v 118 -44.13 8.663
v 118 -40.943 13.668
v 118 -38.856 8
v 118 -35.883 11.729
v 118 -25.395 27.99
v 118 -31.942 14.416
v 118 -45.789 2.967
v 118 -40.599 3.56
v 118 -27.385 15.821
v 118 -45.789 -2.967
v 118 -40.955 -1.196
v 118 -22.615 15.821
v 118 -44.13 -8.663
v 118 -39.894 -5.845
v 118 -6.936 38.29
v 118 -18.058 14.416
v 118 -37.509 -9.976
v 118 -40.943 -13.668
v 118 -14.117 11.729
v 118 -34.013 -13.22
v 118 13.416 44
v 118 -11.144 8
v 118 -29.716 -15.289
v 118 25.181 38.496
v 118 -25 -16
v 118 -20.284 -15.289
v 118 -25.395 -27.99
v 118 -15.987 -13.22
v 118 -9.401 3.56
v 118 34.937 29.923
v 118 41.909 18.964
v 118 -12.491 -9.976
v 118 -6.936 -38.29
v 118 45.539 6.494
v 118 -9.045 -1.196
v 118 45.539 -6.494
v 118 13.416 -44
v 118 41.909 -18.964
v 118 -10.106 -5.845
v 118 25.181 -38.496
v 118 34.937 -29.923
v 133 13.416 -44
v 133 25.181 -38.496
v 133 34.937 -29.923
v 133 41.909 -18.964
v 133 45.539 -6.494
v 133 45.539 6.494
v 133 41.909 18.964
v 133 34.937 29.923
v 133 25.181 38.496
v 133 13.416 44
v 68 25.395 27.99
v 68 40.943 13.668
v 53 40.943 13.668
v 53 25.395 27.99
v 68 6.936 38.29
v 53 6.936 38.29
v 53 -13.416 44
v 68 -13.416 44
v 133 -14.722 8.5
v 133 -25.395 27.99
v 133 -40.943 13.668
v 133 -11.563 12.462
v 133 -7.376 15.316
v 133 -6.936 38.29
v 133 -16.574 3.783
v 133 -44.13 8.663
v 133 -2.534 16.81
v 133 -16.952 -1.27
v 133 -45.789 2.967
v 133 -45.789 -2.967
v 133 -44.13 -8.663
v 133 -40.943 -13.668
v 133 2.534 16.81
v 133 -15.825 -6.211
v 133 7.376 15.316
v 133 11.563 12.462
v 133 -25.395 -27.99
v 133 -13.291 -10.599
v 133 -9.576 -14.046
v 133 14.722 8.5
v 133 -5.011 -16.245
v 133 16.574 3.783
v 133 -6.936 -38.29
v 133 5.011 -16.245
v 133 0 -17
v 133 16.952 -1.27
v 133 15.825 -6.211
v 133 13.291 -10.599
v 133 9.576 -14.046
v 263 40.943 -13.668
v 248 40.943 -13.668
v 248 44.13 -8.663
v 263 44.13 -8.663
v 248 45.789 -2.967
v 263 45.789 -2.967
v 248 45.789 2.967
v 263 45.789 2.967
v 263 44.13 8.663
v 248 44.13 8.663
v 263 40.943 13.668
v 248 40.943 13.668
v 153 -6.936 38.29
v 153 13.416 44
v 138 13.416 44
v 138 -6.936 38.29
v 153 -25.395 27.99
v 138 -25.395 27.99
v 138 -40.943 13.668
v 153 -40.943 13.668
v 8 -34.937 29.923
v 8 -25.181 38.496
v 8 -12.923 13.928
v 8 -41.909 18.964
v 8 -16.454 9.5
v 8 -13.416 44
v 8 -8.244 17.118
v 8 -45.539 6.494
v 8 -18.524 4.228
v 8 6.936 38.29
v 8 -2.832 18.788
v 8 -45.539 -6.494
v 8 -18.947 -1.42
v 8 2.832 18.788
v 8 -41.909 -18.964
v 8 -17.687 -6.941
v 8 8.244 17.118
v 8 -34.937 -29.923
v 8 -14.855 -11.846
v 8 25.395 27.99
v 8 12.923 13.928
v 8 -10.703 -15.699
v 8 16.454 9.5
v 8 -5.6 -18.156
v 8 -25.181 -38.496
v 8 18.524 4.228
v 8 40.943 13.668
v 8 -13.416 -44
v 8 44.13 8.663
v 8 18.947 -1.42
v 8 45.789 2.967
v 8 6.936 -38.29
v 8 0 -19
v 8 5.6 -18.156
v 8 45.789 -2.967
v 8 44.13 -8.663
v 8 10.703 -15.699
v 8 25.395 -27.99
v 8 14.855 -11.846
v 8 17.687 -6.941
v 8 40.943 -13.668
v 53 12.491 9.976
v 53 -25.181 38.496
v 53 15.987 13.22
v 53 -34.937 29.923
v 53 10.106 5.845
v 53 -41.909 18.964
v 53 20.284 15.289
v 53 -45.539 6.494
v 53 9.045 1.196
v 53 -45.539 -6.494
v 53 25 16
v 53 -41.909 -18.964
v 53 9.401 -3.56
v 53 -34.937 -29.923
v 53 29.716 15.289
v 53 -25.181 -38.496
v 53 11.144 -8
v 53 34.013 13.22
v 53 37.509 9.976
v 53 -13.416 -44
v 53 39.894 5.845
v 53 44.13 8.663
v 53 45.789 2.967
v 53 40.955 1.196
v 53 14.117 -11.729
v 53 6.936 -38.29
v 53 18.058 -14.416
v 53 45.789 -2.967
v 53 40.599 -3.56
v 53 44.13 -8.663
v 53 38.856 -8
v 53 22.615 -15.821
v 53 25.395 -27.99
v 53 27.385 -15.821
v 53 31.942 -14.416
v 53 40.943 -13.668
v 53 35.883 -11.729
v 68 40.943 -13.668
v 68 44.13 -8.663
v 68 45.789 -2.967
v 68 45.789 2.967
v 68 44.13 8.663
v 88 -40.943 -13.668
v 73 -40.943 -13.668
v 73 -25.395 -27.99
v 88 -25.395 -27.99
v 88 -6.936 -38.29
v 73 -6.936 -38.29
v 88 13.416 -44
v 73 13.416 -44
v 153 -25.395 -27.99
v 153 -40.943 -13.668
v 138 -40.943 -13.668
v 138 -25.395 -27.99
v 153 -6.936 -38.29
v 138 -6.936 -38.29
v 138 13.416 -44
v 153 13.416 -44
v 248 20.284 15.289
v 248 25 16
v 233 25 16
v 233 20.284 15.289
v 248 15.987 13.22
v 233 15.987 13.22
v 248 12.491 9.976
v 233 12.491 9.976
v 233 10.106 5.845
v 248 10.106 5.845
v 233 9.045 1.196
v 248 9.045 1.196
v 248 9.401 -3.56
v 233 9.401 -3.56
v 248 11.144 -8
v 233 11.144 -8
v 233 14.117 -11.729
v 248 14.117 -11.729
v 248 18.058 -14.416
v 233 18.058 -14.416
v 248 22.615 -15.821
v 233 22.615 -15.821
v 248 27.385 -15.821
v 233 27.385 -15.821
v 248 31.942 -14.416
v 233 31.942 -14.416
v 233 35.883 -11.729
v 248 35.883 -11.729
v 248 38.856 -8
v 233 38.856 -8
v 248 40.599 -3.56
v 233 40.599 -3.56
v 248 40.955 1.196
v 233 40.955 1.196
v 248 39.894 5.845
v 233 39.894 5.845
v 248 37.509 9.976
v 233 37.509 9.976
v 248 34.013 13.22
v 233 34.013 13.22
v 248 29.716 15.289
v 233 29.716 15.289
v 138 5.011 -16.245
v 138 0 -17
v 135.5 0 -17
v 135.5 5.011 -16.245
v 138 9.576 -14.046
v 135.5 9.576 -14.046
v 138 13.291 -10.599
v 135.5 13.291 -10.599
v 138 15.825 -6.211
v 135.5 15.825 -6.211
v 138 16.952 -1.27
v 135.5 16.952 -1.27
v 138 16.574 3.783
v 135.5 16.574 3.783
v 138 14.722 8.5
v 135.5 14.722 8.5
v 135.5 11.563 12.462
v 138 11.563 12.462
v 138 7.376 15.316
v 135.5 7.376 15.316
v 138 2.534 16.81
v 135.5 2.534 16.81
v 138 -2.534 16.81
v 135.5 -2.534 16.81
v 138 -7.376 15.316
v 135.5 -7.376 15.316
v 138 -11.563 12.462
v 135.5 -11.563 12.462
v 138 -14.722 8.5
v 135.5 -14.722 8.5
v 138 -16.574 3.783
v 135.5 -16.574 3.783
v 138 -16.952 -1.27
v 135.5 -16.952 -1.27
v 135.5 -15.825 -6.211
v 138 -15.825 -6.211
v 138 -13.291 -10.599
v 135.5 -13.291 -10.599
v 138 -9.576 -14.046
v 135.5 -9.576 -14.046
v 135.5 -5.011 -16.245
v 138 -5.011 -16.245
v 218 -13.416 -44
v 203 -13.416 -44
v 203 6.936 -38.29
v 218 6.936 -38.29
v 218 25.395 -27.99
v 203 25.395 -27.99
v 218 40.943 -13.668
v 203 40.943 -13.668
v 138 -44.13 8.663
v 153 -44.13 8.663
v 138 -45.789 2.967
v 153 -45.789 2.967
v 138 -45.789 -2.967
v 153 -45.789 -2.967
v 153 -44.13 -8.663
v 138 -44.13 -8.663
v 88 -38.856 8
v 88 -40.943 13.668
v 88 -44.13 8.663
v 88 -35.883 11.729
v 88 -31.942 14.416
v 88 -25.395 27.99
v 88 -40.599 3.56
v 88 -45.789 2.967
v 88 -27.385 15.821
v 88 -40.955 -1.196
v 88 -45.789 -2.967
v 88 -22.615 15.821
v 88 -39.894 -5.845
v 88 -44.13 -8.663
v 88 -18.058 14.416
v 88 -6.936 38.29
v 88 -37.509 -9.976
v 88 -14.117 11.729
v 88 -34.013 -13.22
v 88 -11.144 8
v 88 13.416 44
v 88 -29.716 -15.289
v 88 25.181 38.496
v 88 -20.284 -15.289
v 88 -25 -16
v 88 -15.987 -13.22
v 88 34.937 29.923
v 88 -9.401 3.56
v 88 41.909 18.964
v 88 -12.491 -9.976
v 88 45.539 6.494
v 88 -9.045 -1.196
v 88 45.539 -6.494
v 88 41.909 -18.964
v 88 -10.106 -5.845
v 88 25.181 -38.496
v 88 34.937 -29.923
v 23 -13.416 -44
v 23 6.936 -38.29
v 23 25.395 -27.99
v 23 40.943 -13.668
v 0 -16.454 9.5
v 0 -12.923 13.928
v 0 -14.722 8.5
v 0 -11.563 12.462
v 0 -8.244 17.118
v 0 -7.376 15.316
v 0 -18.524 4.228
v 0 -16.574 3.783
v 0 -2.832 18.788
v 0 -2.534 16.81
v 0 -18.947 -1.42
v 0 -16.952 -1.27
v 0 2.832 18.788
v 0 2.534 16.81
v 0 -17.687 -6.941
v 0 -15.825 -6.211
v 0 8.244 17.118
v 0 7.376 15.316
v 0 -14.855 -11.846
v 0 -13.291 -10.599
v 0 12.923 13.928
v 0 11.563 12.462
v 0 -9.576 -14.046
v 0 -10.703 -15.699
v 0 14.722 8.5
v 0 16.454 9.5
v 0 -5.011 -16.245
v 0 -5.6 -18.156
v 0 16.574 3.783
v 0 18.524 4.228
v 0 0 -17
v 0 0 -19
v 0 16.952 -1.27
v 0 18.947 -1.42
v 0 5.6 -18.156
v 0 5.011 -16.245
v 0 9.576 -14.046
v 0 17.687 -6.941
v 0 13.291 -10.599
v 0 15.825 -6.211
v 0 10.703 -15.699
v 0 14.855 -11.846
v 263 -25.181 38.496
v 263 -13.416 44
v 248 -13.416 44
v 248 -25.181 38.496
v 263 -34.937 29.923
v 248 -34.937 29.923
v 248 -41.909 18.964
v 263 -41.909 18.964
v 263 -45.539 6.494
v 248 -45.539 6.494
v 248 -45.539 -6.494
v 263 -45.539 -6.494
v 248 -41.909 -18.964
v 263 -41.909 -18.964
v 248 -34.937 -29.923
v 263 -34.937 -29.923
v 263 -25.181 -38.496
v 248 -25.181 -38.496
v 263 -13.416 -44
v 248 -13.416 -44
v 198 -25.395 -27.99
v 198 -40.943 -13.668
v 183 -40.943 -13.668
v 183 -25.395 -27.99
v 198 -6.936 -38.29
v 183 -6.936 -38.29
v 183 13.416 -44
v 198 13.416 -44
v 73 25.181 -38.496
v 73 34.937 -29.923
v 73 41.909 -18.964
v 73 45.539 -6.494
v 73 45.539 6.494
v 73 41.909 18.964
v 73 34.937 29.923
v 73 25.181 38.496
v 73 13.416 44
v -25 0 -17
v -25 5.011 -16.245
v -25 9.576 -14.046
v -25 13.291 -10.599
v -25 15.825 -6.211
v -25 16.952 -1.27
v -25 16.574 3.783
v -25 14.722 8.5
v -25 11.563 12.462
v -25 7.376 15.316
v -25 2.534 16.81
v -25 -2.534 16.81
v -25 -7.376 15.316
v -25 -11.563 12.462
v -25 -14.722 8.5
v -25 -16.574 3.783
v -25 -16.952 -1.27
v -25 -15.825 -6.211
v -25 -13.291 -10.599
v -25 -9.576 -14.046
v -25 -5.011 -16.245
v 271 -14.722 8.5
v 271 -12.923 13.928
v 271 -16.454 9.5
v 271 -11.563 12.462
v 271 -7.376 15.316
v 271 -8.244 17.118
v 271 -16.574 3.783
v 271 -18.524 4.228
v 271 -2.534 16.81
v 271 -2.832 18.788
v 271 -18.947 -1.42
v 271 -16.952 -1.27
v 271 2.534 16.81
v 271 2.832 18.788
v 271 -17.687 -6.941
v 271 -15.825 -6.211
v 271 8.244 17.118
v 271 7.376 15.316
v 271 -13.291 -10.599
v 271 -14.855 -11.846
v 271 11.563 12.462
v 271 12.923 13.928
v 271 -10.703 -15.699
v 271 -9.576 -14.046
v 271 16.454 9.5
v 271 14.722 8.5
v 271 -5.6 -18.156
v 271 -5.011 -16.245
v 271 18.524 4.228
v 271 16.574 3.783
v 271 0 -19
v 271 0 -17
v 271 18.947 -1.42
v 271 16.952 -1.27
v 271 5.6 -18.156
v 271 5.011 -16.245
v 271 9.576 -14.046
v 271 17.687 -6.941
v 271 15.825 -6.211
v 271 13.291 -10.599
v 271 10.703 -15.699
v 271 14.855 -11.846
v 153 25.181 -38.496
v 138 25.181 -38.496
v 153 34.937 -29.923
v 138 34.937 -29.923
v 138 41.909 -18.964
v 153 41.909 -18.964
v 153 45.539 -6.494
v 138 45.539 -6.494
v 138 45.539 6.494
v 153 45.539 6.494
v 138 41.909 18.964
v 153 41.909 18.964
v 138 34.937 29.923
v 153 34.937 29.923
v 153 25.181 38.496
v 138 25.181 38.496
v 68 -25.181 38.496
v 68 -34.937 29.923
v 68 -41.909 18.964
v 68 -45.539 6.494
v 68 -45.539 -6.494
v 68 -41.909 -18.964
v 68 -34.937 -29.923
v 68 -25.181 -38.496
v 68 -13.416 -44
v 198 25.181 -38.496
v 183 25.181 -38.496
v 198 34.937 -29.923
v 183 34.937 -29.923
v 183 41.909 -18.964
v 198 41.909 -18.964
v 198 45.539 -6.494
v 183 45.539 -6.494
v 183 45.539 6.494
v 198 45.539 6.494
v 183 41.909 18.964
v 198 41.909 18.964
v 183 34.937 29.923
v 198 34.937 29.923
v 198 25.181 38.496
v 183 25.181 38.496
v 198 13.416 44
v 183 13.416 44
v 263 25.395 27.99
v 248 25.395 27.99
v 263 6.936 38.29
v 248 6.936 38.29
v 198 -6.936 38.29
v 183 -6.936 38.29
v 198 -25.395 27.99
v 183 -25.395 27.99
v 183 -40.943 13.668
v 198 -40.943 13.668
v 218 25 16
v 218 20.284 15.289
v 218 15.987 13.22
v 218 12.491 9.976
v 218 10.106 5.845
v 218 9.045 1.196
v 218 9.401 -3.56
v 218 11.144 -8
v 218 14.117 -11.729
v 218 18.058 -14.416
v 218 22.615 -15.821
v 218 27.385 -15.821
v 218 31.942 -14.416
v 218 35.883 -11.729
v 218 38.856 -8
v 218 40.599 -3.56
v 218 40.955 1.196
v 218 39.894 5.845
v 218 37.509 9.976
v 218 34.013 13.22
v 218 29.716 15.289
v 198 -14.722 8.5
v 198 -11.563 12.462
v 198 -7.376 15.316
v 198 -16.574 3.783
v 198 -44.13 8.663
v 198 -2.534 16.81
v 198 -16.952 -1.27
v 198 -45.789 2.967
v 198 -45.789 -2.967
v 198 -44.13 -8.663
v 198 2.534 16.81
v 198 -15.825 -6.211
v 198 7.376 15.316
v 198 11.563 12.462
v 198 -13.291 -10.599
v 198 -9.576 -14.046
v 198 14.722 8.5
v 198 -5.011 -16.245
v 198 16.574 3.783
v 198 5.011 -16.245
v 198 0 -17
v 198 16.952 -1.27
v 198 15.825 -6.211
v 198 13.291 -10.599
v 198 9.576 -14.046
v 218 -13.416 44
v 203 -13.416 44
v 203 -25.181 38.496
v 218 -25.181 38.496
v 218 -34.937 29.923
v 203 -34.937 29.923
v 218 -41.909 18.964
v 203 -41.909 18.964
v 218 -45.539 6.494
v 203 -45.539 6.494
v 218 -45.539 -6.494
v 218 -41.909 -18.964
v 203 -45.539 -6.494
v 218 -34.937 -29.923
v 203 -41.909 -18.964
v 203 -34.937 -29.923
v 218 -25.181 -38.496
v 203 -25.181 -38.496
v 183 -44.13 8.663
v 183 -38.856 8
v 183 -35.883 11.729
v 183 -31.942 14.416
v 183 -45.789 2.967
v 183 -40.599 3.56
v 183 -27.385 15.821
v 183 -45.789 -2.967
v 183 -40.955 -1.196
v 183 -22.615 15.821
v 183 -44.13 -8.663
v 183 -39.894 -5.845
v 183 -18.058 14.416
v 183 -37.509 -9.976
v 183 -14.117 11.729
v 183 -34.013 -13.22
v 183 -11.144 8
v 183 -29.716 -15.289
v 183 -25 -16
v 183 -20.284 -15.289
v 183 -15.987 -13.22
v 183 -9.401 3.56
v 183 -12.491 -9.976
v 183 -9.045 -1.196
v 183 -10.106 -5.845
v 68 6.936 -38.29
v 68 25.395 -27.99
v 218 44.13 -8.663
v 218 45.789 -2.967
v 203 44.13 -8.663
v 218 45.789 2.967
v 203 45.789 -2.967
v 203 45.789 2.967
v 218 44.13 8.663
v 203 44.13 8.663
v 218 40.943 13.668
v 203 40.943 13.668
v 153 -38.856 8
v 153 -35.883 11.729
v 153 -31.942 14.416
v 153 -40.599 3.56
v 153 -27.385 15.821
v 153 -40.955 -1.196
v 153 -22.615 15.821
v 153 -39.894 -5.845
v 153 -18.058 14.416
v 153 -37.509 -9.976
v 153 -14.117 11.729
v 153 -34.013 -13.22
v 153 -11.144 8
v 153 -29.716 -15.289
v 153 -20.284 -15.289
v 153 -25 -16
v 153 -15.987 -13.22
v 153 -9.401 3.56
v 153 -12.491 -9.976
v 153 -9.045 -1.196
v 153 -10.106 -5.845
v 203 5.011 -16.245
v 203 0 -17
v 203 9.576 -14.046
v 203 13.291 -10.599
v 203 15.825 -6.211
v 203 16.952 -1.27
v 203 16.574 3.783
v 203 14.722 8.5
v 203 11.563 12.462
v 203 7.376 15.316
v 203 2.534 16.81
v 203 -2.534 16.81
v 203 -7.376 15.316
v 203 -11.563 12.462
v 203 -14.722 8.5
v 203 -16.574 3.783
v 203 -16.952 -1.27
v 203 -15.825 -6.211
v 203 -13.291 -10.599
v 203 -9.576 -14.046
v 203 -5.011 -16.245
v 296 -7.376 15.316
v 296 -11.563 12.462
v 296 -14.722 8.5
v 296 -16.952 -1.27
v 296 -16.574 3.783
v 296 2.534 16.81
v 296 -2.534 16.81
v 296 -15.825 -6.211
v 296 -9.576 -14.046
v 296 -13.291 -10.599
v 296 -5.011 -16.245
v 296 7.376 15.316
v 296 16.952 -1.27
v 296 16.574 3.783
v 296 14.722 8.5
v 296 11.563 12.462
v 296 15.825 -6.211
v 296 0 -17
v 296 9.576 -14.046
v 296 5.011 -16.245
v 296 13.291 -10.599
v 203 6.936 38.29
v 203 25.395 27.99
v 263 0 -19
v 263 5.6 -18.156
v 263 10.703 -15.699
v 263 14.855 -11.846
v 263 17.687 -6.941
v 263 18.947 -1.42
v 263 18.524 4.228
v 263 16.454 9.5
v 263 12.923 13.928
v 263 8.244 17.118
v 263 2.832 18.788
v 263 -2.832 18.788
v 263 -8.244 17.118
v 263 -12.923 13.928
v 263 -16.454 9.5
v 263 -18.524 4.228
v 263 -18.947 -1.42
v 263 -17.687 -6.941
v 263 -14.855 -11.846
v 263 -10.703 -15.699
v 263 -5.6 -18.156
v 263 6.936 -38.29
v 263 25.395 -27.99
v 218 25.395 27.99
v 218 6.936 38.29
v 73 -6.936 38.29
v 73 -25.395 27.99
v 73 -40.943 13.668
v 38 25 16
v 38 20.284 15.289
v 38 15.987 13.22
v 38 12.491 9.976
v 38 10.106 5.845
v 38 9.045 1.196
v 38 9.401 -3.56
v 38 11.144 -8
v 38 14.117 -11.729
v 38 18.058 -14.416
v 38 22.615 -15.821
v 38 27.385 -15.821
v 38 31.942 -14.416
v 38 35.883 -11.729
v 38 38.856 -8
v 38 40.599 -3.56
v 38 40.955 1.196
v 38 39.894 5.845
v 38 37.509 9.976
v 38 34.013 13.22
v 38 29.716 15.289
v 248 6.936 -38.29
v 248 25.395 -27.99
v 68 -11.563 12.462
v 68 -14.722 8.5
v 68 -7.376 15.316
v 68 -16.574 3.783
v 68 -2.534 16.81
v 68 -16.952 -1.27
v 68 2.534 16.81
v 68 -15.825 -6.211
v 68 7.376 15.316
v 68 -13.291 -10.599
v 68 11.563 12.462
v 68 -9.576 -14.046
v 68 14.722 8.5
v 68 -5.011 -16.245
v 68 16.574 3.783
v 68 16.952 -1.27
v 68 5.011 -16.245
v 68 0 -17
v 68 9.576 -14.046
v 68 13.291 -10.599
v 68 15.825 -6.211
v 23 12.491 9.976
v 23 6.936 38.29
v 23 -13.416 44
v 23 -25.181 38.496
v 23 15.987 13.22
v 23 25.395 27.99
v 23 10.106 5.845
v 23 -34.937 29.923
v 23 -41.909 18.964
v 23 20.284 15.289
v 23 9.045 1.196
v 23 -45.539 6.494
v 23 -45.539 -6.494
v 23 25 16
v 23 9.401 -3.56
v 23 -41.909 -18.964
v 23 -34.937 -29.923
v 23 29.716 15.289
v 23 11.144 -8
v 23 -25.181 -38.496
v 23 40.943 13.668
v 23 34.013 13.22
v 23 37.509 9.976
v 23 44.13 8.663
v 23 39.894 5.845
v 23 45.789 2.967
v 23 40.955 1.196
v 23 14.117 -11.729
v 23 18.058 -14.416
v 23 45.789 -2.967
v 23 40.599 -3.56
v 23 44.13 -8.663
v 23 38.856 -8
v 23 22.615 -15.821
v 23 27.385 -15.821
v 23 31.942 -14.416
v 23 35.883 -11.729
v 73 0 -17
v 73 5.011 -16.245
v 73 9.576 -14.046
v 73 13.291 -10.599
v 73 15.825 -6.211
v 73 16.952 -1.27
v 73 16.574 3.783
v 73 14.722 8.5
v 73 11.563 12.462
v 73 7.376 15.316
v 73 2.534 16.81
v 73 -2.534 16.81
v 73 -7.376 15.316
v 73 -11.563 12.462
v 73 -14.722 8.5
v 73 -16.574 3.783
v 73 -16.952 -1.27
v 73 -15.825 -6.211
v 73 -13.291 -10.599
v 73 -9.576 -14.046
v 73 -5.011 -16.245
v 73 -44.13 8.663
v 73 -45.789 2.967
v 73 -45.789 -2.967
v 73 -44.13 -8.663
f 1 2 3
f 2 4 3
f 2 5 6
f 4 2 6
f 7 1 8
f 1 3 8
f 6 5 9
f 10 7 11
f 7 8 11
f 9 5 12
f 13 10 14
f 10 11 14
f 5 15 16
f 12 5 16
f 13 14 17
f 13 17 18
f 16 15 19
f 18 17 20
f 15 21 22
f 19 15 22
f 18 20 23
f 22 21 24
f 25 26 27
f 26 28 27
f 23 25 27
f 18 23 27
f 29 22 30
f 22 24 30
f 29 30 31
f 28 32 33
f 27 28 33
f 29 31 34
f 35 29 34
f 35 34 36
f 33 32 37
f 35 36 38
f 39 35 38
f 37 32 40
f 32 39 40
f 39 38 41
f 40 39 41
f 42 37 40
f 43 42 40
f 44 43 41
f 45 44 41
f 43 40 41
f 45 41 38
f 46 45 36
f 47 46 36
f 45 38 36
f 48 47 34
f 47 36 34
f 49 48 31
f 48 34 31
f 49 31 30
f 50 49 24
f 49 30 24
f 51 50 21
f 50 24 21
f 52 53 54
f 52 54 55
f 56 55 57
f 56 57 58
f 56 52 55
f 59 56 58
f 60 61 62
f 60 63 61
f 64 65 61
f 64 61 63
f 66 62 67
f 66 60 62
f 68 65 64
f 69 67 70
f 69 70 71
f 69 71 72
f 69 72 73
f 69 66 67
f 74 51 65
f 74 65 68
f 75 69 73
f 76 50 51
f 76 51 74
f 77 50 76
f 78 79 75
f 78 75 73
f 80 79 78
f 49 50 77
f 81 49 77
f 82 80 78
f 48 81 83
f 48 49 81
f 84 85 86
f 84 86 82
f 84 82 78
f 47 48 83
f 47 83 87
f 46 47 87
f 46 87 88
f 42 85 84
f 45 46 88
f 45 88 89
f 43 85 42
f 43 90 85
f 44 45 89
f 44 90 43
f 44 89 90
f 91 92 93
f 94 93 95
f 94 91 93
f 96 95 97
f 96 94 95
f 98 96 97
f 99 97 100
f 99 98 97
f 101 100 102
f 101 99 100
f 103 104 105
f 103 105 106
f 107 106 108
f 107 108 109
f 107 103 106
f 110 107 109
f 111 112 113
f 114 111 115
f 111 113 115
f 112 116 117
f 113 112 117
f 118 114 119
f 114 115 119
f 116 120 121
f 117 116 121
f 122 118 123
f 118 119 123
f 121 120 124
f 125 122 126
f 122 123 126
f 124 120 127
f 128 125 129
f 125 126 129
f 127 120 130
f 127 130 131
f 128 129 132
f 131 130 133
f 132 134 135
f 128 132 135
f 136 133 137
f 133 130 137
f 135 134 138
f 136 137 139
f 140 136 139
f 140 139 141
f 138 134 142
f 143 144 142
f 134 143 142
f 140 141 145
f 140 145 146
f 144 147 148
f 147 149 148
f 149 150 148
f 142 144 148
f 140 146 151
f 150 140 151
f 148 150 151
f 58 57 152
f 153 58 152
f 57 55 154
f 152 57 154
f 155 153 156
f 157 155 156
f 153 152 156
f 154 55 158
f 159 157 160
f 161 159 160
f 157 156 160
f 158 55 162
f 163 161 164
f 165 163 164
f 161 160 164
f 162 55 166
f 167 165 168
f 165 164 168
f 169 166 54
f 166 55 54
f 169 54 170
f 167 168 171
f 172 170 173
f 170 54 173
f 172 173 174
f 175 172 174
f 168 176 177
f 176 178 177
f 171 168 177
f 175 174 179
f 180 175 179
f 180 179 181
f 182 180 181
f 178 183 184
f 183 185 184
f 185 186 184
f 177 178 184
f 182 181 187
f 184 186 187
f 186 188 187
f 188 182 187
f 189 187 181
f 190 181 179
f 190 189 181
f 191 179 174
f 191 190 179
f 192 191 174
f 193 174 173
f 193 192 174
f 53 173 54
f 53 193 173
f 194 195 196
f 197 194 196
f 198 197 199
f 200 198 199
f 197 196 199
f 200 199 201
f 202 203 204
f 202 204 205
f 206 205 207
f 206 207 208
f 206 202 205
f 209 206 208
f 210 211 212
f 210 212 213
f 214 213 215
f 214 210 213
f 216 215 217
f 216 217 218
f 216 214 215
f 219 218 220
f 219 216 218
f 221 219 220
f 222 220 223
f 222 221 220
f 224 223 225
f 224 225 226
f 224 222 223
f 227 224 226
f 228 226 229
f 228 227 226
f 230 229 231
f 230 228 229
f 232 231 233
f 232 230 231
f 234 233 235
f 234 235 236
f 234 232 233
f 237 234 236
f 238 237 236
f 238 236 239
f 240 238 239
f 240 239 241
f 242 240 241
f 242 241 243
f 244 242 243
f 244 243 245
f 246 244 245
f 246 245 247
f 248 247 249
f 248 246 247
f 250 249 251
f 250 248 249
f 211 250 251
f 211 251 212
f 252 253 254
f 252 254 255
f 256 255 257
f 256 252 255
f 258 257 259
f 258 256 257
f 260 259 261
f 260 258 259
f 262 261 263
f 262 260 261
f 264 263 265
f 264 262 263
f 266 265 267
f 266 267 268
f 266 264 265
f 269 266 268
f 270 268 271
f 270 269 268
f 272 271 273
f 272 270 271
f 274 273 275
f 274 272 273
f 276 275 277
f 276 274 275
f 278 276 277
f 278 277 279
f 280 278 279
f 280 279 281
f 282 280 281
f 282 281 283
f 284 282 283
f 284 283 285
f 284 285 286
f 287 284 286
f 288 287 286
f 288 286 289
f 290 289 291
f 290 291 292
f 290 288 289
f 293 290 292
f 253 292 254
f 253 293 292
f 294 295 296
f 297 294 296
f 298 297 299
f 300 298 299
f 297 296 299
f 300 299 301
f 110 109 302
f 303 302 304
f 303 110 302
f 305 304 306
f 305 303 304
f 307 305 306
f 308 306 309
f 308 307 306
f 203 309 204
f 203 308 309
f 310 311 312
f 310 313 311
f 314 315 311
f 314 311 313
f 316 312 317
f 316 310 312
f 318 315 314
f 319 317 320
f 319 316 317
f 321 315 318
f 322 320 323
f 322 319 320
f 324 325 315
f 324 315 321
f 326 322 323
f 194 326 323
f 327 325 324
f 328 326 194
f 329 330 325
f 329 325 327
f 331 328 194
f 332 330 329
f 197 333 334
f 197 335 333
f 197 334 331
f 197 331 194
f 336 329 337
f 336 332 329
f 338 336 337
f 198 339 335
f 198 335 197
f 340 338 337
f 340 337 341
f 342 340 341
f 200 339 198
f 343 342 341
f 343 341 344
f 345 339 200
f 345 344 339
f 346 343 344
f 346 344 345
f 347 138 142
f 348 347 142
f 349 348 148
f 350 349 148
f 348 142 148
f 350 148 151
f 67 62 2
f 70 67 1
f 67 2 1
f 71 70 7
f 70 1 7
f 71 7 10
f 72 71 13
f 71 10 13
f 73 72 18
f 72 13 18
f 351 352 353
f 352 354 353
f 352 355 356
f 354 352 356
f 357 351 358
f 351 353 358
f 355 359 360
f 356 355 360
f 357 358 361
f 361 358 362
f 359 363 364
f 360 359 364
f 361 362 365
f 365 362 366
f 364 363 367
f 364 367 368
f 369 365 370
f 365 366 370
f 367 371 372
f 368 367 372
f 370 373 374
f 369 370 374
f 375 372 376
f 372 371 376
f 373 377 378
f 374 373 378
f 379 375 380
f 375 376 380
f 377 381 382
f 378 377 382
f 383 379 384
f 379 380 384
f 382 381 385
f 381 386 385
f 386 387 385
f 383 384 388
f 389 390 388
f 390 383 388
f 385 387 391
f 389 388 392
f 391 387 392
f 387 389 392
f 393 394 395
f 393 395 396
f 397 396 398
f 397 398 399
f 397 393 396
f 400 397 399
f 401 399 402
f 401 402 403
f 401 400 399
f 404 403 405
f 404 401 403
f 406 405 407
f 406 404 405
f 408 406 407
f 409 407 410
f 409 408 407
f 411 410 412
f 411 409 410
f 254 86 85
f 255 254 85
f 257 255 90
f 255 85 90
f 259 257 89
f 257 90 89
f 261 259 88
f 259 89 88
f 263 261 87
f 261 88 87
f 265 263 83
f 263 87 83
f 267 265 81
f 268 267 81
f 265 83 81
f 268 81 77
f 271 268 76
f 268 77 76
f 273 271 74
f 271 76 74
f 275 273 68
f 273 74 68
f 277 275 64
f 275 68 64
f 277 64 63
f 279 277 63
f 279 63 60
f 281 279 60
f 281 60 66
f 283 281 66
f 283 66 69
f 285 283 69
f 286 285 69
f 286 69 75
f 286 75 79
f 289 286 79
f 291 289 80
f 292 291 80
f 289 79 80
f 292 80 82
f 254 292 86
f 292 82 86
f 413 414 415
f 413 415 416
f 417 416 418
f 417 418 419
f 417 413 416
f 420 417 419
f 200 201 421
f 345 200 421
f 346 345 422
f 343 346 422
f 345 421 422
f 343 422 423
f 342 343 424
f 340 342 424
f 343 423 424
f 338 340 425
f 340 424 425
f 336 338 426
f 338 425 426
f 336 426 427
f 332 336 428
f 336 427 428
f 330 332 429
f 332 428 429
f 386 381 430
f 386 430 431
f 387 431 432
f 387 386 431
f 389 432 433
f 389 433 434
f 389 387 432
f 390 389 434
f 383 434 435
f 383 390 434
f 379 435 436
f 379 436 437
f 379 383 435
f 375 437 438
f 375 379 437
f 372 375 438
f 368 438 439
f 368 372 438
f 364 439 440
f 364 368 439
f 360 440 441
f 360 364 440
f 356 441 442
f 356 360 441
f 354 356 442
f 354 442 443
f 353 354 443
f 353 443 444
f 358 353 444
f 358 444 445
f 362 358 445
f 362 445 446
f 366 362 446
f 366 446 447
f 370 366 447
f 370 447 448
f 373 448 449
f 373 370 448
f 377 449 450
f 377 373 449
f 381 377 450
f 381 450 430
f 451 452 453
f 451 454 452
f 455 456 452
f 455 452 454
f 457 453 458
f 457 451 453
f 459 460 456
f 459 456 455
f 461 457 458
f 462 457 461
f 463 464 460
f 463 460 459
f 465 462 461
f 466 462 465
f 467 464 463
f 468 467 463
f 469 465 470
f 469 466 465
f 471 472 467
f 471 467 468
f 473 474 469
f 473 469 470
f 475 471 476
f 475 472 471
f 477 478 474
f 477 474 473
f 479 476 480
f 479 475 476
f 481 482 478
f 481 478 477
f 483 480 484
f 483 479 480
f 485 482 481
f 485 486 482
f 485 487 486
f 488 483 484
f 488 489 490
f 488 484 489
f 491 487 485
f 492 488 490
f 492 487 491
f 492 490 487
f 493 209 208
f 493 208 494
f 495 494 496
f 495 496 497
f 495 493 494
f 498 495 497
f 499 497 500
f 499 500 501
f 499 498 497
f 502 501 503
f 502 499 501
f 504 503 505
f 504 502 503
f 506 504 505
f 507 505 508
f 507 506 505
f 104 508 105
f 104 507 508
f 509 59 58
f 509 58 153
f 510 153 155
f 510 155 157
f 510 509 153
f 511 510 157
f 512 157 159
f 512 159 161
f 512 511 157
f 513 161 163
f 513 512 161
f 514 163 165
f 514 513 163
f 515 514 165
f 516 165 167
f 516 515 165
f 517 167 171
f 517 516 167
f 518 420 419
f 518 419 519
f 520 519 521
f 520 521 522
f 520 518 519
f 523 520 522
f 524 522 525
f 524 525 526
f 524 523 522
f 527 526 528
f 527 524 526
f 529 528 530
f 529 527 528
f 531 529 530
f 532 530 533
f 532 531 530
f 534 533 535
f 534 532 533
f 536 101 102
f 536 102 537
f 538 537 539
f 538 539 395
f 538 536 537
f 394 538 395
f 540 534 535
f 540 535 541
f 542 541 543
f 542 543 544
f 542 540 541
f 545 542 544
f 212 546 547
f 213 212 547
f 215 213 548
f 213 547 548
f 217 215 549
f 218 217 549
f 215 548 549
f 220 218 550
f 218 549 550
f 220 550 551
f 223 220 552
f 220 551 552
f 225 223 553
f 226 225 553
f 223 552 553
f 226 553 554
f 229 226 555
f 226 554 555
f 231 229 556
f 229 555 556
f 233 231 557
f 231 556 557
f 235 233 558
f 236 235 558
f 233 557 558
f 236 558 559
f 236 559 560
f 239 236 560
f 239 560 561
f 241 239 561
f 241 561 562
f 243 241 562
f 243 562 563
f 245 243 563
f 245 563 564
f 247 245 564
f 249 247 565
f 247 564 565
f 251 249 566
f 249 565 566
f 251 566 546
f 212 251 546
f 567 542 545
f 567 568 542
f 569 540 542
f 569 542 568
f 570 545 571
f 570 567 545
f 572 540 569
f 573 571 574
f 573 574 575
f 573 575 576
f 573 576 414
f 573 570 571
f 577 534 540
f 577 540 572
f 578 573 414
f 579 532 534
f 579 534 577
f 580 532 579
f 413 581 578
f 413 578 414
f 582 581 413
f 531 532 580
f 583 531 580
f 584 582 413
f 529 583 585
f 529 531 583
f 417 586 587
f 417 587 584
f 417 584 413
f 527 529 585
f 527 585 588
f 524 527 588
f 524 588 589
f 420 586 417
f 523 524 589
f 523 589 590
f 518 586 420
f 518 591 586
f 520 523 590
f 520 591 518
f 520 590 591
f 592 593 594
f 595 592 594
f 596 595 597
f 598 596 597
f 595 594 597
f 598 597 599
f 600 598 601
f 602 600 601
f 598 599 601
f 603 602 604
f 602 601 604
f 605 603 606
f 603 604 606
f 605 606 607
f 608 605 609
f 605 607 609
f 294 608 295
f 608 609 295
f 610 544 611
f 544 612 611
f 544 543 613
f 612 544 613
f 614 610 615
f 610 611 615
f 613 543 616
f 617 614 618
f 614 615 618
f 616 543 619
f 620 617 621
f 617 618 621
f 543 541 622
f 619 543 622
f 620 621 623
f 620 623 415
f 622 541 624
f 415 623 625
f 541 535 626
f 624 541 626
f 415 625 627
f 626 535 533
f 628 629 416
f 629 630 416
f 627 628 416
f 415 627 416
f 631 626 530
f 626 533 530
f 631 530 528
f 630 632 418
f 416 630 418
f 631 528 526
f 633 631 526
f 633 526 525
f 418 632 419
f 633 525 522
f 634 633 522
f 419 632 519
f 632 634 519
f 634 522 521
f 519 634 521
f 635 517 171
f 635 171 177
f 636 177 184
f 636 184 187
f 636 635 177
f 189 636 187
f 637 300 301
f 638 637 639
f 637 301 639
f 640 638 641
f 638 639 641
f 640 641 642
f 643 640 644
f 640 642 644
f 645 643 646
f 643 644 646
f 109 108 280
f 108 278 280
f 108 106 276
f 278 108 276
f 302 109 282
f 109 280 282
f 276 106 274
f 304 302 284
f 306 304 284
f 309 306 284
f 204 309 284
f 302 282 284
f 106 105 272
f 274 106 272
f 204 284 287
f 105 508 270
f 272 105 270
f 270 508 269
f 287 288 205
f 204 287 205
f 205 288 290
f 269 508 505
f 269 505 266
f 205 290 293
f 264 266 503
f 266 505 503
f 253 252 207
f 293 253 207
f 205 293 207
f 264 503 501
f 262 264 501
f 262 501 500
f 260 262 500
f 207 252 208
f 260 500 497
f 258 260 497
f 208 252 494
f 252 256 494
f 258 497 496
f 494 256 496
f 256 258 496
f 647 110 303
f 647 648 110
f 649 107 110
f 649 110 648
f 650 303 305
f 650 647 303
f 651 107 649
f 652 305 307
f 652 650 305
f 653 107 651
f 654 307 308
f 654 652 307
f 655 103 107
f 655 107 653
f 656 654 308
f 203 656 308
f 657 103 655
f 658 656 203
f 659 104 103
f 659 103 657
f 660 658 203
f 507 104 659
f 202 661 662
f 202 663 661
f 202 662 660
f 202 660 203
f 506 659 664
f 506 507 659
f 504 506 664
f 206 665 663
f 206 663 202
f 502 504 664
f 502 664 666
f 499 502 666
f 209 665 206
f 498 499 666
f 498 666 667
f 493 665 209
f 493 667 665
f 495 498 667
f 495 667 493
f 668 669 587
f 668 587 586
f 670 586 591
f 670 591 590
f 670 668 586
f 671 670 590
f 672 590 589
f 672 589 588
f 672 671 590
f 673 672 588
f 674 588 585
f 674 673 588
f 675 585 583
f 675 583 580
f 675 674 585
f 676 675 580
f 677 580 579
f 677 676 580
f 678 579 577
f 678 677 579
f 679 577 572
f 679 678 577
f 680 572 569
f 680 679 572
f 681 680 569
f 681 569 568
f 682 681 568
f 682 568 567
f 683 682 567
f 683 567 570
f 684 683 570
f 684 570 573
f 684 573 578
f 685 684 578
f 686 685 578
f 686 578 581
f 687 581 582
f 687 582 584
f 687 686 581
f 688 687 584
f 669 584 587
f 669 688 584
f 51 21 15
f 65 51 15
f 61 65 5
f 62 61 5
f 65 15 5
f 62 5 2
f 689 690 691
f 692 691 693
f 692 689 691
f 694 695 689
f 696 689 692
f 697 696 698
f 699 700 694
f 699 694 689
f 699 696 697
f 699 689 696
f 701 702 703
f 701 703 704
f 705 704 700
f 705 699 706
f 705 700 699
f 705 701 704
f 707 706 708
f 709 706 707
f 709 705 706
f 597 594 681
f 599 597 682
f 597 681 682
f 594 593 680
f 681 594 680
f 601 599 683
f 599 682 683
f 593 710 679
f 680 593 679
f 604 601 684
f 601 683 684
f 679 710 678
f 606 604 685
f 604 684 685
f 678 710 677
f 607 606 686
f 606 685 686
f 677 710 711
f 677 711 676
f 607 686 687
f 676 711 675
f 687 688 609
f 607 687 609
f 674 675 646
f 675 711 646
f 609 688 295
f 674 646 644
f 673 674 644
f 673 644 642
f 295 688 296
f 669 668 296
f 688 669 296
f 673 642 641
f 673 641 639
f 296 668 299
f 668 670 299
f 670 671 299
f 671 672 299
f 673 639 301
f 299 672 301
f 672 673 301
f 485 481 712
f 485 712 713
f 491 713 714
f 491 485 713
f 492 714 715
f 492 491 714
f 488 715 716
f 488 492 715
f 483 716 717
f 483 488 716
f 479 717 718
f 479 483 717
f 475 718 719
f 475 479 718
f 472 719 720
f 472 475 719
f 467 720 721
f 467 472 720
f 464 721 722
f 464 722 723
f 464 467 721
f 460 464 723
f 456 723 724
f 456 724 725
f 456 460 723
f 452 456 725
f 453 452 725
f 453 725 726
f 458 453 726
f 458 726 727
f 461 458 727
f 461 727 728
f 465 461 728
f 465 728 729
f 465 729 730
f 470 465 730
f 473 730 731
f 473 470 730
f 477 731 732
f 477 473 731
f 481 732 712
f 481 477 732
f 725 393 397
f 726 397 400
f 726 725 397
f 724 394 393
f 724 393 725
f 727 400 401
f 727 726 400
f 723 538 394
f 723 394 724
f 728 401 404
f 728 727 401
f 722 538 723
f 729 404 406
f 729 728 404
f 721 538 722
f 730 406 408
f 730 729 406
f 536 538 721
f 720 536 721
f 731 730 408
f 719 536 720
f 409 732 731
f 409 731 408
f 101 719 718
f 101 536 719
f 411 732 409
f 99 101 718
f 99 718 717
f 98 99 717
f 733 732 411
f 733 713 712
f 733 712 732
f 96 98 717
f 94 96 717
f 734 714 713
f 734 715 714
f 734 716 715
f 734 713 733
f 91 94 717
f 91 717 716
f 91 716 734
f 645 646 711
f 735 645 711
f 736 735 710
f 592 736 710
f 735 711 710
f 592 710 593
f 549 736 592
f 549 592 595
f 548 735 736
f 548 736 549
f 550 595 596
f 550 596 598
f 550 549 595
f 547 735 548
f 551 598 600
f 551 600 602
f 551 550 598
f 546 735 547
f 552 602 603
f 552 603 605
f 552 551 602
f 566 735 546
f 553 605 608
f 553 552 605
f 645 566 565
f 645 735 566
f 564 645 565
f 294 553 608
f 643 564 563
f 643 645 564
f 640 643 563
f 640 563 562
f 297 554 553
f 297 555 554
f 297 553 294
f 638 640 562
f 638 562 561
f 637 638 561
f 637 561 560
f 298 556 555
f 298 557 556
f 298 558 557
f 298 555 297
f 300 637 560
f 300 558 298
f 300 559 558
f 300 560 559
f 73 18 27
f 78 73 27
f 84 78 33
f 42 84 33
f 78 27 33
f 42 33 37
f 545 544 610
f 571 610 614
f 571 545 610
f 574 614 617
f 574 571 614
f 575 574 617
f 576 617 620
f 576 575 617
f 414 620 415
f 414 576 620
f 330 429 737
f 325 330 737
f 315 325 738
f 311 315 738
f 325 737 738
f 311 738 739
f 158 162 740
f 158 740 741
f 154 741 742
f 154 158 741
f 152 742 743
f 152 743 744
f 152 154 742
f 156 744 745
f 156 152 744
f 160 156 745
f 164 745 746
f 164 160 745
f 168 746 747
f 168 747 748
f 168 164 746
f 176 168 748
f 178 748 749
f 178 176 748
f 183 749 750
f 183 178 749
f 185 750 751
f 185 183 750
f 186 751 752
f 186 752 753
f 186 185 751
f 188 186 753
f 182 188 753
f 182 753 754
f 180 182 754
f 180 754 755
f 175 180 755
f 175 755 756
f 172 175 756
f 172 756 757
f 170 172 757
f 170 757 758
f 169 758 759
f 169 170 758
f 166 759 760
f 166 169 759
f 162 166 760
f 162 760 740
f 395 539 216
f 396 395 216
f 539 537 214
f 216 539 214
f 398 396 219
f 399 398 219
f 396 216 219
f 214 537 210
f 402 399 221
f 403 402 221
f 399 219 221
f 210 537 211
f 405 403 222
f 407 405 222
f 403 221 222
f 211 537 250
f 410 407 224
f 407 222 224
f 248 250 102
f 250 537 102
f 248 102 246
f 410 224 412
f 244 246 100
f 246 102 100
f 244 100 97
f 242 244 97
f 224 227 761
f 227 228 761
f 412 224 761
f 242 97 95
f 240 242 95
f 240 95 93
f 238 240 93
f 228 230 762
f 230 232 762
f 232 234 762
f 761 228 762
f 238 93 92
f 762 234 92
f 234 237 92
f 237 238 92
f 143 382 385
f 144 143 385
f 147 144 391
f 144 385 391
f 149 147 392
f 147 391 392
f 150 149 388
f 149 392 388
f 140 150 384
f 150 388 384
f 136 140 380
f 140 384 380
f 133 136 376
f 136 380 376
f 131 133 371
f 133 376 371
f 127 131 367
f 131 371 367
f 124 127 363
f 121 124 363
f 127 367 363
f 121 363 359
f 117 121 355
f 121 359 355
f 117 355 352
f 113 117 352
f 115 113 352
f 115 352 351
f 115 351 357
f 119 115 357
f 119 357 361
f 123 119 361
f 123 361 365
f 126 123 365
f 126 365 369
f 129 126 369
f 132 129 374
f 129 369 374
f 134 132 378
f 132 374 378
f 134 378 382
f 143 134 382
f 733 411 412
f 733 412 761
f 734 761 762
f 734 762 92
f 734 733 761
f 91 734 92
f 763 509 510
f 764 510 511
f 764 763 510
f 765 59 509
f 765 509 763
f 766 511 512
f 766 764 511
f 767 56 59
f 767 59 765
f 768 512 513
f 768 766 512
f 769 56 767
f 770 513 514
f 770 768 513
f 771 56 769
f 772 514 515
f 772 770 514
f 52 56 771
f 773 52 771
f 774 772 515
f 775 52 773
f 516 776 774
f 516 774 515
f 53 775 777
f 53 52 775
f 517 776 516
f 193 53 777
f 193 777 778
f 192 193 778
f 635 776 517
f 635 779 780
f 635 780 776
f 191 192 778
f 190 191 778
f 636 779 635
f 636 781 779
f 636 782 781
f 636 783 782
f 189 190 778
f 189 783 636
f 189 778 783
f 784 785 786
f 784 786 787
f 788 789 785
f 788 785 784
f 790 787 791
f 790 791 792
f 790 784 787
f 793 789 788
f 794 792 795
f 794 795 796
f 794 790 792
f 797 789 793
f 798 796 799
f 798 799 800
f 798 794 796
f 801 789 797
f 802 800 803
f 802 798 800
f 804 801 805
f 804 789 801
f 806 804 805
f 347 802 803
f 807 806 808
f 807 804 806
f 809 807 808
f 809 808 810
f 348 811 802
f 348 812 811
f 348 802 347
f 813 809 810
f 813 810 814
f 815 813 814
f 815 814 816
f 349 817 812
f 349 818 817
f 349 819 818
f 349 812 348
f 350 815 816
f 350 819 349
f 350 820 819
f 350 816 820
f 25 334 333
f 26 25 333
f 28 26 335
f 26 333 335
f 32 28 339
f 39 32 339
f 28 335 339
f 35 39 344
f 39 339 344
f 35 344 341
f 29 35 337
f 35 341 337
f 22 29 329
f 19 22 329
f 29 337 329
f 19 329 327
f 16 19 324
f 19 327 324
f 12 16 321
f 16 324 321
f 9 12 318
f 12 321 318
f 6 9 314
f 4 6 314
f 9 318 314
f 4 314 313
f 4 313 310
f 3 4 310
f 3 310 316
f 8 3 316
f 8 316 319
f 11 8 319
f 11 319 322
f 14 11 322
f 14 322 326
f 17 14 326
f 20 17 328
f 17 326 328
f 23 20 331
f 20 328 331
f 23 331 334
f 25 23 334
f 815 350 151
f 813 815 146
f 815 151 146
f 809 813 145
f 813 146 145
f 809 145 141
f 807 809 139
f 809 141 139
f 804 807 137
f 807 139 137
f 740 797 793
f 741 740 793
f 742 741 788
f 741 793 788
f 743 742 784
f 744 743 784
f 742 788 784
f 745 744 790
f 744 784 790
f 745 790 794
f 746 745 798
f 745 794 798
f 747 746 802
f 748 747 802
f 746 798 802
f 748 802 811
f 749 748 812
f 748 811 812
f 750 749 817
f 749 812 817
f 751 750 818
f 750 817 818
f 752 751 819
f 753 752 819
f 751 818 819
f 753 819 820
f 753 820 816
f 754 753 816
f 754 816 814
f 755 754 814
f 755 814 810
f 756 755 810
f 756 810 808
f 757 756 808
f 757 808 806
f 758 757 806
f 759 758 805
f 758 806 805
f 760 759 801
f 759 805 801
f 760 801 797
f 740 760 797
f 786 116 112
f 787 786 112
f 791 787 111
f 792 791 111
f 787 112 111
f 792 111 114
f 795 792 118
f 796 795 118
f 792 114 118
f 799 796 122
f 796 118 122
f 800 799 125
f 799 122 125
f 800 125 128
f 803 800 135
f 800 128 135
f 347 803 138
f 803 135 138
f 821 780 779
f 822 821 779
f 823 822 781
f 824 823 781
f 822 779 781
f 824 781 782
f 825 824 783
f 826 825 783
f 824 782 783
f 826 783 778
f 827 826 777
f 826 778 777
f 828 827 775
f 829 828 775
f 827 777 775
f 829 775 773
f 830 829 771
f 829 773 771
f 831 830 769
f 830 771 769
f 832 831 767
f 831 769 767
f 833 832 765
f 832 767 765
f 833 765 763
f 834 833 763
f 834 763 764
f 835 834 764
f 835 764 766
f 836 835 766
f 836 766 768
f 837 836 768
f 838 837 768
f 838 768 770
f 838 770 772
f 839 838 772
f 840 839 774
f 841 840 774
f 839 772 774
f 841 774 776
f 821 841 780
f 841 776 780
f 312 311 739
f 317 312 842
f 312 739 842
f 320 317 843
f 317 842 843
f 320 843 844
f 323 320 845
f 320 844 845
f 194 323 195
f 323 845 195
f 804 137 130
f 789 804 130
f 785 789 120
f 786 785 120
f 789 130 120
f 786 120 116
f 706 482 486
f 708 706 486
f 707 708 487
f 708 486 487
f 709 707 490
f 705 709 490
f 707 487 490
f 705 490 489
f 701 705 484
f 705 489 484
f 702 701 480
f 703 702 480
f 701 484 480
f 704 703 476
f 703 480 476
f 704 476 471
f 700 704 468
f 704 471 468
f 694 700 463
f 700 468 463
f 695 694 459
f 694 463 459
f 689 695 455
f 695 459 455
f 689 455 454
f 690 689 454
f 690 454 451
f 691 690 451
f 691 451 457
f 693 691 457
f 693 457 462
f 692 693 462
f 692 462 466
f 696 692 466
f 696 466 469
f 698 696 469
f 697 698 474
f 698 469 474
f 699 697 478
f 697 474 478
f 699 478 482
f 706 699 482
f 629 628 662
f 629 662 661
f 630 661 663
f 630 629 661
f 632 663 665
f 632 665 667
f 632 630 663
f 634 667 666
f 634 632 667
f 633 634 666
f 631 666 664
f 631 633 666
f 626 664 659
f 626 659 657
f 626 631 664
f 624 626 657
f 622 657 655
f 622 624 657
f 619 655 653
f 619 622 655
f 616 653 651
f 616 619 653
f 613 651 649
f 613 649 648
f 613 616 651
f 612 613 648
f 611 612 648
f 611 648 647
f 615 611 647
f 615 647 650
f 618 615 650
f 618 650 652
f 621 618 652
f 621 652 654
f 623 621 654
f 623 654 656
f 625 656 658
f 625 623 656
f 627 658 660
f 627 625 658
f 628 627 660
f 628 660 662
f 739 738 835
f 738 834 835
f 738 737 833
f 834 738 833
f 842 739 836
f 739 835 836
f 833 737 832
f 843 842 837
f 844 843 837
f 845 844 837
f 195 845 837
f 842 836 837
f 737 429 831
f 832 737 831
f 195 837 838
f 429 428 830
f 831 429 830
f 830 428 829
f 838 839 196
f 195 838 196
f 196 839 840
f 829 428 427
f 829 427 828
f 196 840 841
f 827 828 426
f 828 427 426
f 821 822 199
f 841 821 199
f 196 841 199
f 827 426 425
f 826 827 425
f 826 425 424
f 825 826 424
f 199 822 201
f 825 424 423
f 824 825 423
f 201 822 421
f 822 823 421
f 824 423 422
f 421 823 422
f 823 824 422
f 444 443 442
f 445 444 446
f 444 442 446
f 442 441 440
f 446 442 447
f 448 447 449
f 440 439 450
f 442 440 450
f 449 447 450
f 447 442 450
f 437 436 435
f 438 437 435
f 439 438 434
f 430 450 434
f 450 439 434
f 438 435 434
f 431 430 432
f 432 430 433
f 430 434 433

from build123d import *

# Parameters (mm, degrees)
SKETCH2_R           = 17
BOSS_EXTRUDE1_DEPTH = 25
SKETCH2_3_R         = 19
SKETCH2_3_R_2       = 17
BOSS_EXTRUDE2_DEPTH = 8
BOSS_EXTRUDE3_DEPTH = 15
SKETCH4_R           = 16
BOSS_EXTRUDE4_DEPTH = 15
SKETCH5_R           = 17
BOSS_EXTRUDE5_DEPTH = 5
BOSS_EXTRUDE6_DEPTH = 15
SKETCH7_R           = 16
BOSS_EXTRUDE7_DEPTH = 30
BOSS_EXTRUDE8_DEPTH = 15
SKETCH9_R           = 17
BOSS_EXTRUDE9_DEPTH = 2.5


with BuildPart() as part:
    # Sketch2 → Boss-Extrude1 (new body)
    with BuildSketch(Plane(origin=(0, 0, 0), x_dir=(0, 0, -1), z_dir=(1, 0, 0))):
        Circle(SKETCH2_R)
    extrude(amount=-BOSS_EXTRUDE1_DEPTH)

    # Sketch2_3 → Boss-Extrude2 (add)
    with BuildSketch(Plane(origin=(0, 0, 0), x_dir=(0, 0, -1), z_dir=(1, 0, 0))):
        Circle(SKETCH2_3_R)
        Circle(SKETCH2_3_R_2, mode=Mode.SUBTRACT)
        Circle(SKETCH2_3_R_2)
    extrude(amount=BOSS_EXTRUDE2_DEPTH)

    # Sketch3 → Boss-Extrude3 (add)
    with BuildSketch(Plane(origin=(8, 0, 0), x_dir=(0, 0, -1), z_dir=(1, 0, 0))):
        with BuildLine():
            ThreePointArc((13.668094758, 40.943123461), (0, 46), (-13.668094758, 40.943123461))
            ThreePointArc((-13.668094758, 40.943123461), (-33.683444249, 16.469257624), (-44, -13.416407865))
            ThreePointArc((-44, -13.416407865), (0, -46), (44, -13.416407865))
            ThreePointArc((44, -13.416407865), (33.683444249, 16.469257624), (13.668094758, 40.943123461))
        make_face()
    boss_extrude3 = extrude(amount=BOSS_EXTRUDE3_DEPTH)

    # Sketch4 → Boss-Extrude4 (add)
    with BuildSketch(Plane(origin=(23, 0, 0), x_dir=(0, 0, -1), z_dir=(1, 0, 0))):
        with Locations(Location((0, 25, 0), (0, 0, 180))):
            Circle(SKETCH4_R)
    boss_extrude4 = extrude(amount=BOSS_EXTRUDE4_DEPTH)

    # Mirror1: Boss-Extrude3, Boss-Extrude4 across plane
    add(boss_extrude3.mirror(Plane(origin=(38, 25, 0), x_dir=(0, 0, 1), z_dir=(1, 0, 0))))
    add(boss_extrude4.mirror(Plane(origin=(38, 25, 0), x_dir=(0, 0, 1), z_dir=(1, 0, 0))))

    # Sketch5 → Boss-Extrude5 (add)
    with BuildSketch(Plane(origin=(68, 0, 0), x_dir=(0, 0, -1), z_dir=(1, 0, 0))):
        Circle(SKETCH5_R)
    extrude(amount=BOSS_EXTRUDE5_DEPTH)

    # Sketch6 → Boss-Extrude6 (add)
    with BuildSketch(Plane(origin=(73, 0, 0), x_dir=(0, 0, -1), z_dir=(1, 0, 0))):
        with BuildLine():
            ThreePointArc((-13.668094758, -40.943123461), (0, -46), (13.668094758, -40.943123461))
            ThreePointArc((13.668094758, -40.943123461), (33.683444249, -16.469257624), (44, 13.416407865))
            ThreePointArc((44, 13.416407865), (0, 46), (-44, 13.416407865))
            ThreePointArc((-44, 13.416407865), (-33.683444249, -16.469257624), (-13.668094758, -40.943123461))
        make_face()
    extrude(amount=BOSS_EXTRUDE6_DEPTH)

    # Sketch7 → Boss-Extrude7 (add)
    with BuildSketch(Plane(origin=(88, 0, 0), x_dir=(0, 0, -1), z_dir=(1, 0, 0))):
        with Locations((0, -25)):
            Circle(SKETCH7_R)
    extrude(amount=BOSS_EXTRUDE7_DEPTH)

    # Sketch8 → Boss-Extrude8 (add)
    with BuildSketch(Plane(origin=(118, 0, 0), x_dir=(0, 0, -1), z_dir=(1, 0, 0))):
        with BuildLine():
            ThreePointArc((-13.668094758, -40.943123461), (0, -46), (13.668094758, -40.943123461))
            ThreePointArc((13.668094758, -40.943123461), (33.683444249, -16.469257624), (44, 13.416407865))
            ThreePointArc((44, 13.416407865), (0, 46), (-44, 13.416407865))
            ThreePointArc((-44, 13.416407865), (-33.683444249, -16.469257624), (-13.668094758, -40.943123461))
        make_face()
    extrude(amount=BOSS_EXTRUDE8_DEPTH)

    # Sketch9 → Boss-Extrude9 (add)
    with BuildSketch(Plane(origin=(133, 0, 0), x_dir=(0, 0, -1), z_dir=(1, 0, 0))):
        Circle(SKETCH9_R)
    extrude(amount=BOSS_EXTRUDE9_DEPTH)

    # Mirror2: part across plane


with BuildPart() as part_1:
    add(part.part)
    add(part.part.mirror(Plane(origin=(135.5, 0, 0), x_dir=(0, 0, 1), z_dir=(1, 0, 0))))


solid = part_1.part
